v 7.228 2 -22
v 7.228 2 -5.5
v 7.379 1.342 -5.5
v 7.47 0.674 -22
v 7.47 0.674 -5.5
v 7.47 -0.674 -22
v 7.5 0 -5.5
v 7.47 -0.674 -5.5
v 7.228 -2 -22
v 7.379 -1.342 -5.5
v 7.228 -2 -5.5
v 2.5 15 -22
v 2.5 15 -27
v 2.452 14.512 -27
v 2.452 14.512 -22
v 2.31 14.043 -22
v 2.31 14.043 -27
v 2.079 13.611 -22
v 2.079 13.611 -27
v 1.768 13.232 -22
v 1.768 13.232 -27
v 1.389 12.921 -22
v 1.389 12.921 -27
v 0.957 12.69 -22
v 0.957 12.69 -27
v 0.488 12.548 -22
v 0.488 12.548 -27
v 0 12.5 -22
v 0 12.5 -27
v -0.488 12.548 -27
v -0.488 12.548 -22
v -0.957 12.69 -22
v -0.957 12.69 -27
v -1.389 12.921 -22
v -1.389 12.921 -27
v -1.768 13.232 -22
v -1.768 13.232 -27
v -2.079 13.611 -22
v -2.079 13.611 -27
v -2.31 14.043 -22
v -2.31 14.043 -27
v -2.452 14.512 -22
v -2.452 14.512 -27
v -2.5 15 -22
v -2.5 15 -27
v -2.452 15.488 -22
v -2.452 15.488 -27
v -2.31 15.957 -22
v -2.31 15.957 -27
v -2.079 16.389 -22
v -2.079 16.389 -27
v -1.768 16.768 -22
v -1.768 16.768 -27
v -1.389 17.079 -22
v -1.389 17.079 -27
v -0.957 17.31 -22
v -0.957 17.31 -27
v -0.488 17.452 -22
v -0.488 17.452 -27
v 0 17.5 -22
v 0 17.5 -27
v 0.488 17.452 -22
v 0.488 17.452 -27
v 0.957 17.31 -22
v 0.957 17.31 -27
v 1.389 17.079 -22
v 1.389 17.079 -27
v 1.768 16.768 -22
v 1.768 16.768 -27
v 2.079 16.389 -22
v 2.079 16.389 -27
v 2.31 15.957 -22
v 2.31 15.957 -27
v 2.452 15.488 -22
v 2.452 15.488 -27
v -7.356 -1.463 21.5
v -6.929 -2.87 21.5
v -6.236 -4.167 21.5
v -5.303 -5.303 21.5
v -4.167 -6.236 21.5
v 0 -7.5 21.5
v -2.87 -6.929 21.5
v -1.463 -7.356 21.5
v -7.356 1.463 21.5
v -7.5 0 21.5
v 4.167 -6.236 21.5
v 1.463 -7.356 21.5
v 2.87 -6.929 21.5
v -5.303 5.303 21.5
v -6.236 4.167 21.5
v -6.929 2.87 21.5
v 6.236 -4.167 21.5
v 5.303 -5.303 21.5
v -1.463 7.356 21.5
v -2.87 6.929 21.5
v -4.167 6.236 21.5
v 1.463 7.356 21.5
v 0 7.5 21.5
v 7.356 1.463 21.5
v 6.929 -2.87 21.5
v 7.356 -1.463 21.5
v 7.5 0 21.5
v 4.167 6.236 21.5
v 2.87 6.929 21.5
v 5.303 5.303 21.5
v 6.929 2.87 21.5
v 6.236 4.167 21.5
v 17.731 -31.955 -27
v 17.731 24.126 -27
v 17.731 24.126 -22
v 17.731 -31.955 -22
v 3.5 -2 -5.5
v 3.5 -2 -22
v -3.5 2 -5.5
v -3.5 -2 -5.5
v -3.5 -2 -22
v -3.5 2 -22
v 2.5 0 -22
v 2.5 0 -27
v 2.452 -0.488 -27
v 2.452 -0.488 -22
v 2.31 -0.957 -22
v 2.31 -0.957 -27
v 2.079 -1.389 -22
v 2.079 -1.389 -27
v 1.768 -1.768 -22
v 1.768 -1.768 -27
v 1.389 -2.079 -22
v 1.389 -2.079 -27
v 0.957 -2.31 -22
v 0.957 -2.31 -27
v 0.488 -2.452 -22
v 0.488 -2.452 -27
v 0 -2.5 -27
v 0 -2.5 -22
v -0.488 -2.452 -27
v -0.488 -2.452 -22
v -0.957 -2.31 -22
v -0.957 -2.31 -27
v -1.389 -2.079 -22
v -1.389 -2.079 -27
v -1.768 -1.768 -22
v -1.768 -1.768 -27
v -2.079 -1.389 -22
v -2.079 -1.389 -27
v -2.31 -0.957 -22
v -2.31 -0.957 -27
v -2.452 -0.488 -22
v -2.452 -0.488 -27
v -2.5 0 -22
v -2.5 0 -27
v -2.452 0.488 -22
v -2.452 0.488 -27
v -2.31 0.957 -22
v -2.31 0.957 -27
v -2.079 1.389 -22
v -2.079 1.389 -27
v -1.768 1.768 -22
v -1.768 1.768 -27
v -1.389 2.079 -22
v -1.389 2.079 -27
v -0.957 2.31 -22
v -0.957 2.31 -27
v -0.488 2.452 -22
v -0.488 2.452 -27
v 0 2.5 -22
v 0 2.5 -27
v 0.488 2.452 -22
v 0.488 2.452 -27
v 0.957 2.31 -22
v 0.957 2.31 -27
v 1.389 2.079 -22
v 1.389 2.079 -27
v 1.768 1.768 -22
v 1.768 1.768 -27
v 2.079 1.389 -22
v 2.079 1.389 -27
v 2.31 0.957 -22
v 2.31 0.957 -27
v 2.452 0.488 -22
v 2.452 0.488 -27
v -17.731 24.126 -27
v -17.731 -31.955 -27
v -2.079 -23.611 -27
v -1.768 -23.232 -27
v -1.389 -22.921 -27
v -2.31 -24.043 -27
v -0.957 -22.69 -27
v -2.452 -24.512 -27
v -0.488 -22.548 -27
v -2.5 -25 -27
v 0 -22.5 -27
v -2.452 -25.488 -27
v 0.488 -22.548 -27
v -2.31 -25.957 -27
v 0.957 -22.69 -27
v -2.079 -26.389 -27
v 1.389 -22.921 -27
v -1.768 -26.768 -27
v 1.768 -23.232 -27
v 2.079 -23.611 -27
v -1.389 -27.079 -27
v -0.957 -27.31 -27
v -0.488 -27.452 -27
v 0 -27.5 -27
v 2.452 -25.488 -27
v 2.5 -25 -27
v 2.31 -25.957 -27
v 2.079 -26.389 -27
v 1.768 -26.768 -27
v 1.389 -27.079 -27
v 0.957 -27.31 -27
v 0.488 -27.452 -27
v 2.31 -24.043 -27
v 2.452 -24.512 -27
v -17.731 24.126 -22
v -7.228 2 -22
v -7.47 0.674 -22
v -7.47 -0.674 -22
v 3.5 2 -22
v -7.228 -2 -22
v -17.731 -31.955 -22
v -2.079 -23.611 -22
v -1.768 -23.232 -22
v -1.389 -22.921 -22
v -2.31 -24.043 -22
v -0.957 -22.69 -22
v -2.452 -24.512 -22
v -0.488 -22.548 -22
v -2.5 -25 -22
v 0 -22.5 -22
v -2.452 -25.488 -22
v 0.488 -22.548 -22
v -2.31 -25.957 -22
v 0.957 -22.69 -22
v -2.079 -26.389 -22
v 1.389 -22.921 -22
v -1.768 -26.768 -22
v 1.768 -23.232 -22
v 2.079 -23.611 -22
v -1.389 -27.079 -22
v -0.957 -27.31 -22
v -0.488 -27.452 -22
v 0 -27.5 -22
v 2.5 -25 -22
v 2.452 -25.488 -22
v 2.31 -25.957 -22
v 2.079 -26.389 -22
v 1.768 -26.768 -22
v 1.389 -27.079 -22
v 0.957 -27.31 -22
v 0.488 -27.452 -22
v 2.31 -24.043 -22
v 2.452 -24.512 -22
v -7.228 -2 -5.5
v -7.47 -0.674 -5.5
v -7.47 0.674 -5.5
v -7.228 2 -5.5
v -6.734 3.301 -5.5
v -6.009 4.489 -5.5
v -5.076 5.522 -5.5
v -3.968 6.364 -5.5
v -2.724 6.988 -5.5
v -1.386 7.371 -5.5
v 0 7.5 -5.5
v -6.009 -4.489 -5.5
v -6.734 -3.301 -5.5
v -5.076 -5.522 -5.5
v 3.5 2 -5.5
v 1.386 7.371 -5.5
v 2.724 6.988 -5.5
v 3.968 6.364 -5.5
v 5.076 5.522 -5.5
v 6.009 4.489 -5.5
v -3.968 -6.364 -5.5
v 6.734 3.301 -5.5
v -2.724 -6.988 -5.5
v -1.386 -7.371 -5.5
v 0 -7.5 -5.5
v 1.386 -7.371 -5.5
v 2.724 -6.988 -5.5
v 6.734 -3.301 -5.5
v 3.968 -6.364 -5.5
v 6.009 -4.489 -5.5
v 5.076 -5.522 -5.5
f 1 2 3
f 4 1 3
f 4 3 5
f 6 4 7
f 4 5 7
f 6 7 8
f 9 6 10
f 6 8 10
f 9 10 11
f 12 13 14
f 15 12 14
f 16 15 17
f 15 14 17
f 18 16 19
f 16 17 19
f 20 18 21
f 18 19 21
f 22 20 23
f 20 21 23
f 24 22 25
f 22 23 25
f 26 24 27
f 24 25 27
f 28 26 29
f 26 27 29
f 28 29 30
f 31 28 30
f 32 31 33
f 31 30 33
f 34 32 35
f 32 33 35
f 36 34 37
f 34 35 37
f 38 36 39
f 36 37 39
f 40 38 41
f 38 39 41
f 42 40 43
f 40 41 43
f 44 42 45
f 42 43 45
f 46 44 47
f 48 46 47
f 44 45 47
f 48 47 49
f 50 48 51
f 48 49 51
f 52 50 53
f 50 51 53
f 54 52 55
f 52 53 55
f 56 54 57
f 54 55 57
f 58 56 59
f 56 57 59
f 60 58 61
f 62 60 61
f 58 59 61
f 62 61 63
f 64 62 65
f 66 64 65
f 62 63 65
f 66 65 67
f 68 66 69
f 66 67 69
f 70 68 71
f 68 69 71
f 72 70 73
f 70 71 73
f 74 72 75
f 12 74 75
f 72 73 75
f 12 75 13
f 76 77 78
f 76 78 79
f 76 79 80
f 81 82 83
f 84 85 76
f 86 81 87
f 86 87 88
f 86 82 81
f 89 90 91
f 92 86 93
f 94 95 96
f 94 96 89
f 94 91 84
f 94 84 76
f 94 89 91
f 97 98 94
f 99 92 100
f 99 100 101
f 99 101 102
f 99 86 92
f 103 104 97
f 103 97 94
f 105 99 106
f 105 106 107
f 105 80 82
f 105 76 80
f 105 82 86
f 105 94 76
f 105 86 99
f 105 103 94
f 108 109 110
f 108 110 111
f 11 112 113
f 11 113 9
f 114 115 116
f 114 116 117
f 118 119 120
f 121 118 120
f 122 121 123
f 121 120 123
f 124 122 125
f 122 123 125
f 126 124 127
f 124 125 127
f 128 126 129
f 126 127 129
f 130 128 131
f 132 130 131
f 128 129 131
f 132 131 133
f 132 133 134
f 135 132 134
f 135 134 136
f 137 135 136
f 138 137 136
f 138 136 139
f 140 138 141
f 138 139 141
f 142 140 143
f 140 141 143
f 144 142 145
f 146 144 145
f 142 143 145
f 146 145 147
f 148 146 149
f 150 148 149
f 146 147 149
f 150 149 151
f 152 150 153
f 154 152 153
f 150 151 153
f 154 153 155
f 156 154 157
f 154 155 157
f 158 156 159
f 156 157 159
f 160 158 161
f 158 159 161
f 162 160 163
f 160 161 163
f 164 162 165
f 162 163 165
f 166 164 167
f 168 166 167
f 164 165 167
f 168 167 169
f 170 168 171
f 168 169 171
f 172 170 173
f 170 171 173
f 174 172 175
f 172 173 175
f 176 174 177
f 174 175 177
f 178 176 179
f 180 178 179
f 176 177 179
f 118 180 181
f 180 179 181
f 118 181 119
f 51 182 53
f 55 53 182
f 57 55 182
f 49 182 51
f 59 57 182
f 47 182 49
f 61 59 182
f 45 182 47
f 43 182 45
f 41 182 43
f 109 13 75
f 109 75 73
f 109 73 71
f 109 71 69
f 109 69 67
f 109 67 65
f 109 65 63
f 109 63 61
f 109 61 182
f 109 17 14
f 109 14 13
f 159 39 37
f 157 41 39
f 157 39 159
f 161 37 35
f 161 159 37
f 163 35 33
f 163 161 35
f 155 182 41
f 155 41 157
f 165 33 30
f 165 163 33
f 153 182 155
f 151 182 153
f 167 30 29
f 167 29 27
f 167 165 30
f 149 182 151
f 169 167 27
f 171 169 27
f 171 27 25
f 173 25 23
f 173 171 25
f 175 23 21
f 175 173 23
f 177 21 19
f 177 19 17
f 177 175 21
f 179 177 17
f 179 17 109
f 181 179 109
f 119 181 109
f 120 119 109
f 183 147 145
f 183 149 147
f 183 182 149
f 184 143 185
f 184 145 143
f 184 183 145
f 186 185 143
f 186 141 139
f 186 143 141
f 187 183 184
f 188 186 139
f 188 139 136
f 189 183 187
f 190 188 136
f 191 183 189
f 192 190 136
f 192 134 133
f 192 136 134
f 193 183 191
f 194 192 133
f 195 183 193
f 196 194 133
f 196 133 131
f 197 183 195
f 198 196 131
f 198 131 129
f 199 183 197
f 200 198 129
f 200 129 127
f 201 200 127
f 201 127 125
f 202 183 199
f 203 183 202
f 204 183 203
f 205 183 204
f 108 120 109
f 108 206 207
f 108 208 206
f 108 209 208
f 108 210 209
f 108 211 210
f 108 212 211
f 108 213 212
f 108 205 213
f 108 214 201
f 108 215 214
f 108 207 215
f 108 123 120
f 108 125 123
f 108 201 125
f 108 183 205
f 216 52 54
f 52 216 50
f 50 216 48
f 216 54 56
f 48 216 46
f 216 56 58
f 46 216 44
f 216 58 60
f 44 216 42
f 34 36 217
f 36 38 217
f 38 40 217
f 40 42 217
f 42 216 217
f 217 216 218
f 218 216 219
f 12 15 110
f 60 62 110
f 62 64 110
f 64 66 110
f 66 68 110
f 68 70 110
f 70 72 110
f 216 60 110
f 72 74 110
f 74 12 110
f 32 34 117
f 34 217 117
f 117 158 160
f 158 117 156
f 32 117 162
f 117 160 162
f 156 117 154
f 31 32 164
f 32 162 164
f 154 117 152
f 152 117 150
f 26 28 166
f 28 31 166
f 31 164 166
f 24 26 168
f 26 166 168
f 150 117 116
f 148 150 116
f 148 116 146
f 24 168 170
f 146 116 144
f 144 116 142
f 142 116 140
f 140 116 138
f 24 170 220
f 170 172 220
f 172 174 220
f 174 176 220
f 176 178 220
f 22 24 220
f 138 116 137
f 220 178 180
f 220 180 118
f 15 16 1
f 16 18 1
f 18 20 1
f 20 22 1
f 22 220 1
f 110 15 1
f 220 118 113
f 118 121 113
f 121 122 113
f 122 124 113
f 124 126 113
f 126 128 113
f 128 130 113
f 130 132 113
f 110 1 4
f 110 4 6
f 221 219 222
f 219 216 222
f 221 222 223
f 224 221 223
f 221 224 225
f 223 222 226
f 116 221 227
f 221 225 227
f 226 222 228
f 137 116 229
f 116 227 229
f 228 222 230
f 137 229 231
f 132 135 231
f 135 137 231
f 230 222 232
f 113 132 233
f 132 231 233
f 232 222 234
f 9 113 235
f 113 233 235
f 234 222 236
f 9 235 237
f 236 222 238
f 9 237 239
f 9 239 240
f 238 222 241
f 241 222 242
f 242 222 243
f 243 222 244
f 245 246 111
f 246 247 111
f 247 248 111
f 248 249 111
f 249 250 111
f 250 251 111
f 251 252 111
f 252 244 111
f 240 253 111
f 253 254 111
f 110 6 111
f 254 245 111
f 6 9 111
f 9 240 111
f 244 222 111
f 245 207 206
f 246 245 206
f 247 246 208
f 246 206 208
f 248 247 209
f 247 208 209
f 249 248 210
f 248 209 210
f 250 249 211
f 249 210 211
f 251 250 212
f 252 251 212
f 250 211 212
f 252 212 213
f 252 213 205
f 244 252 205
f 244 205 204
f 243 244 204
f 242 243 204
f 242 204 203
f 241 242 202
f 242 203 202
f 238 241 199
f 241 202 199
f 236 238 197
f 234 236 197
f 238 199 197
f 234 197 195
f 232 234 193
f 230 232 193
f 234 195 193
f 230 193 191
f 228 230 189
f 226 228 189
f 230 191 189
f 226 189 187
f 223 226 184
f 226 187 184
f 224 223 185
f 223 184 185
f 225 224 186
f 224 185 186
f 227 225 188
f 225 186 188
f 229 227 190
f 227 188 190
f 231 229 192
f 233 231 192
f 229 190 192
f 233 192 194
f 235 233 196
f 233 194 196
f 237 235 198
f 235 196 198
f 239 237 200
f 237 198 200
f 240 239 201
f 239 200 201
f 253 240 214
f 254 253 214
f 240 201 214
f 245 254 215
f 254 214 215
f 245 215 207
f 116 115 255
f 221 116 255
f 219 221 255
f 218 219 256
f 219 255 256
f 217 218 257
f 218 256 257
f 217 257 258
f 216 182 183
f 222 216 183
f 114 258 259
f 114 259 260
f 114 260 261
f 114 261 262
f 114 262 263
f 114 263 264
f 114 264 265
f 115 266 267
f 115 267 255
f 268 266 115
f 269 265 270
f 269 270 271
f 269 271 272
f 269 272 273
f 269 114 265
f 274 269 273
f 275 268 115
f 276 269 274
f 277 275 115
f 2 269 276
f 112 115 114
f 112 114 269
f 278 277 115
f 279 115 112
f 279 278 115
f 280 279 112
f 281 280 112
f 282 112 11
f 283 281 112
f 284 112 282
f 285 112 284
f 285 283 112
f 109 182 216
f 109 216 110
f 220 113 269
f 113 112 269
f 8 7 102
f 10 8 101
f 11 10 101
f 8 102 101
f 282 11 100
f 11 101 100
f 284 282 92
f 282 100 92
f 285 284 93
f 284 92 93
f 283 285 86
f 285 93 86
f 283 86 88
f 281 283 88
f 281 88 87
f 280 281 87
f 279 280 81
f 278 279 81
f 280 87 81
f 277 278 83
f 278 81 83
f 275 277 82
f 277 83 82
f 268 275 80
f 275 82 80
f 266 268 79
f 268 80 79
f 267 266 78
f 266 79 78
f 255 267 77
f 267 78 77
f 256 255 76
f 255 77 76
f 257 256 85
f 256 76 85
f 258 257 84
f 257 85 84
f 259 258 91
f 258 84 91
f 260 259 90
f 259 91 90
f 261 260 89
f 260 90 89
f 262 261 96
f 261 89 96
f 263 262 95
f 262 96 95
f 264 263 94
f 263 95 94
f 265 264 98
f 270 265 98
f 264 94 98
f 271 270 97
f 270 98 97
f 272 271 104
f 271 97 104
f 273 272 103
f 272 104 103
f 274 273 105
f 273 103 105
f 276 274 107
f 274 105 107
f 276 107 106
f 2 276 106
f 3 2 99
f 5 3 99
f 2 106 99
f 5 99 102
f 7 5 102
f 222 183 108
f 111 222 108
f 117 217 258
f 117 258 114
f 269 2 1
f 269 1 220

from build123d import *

# Parameters (mm, degrees)
SKETCH_R     = 7.5
PAD_DEPTH    = 9
SKETCH001_R  = 7.5
PAD001_DEPTH = 2
SKETCH002_R  = 7.5
PAD002_DEPTH = 9
SKETCH003_R  = 7.5
PAD003_DEPTH = 1.5
SKETCH004_R  = 7.5
PAD004_DEPTH = 5.5
PAD005_DEPTH = 21.5
SKETCH006_R  = 12.5
PAD006_DEPTH = 5
SKETCH007_W  = 35.462824
SKETCH007_H  = 56.081524
SKETCH007_R  = 2.5
PAD007_DEPTH = 5


with BuildPart() as part:
    # Sketch → Pad (new body)
    with BuildSketch(Plane.XY):
        Circle(SKETCH_R)
    extrude(amount=PAD_DEPTH)

    # Sketch001 (on Face3 of Pad) → Pad001 (join)
    with BuildSketch(Plane.XY.offset(9)):
        Circle(SKETCH001_R)
    extrude(amount=PAD001_DEPTH)

    # Sketch002 (on Face4 of Pad001) → Pad002 (join)
    with BuildSketch(Plane.XY.offset(11)):
        Circle(SKETCH002_R)
    extrude(amount=PAD002_DEPTH)

    # Sketch003 (on Face5 of Pad002) → Pad003 (join)
    with BuildSketch(Plane.XY.offset(20)):
        Circle(SKETCH003_R)
    extrude(amount=PAD003_DEPTH)

    # Sketch004 (on Face2 of Pad003) → Pad004 (join)
    with BuildSketch(Plane(origin=(0, 0, 0), x_dir=(1, 0, 0), z_dir=(0, 0, -1))):
        Circle(SKETCH004_R)
    extrude(amount=PAD004_DEPTH)

    # Sketch005 (on Face4 of Pad004) → Pad005 (join)
    with BuildSketch(Plane(origin=(0, 0, -5.5), x_dir=(1, 0, 0), z_dir=(0, 0, -1))):
        with BuildLine():
            Line((3.5, 2), (3.5, -2))
            Line((3.5, -2), (7.228416, -2))
            ThreePointArc((7.228416, -2), (7.5, 0), (7.228416, 2))
            Line((3.5, 2), (7.228416, 2))
        make_face()
        with BuildLine():
            Line((-3.5, 2), (-3.5, -2))
            Line((-3.5, -2), (-7.228416, -2))
            ThreePointArc((-7.228416, 2), (-7.5, 0), (-7.228416, -2))
            Line((-3.5, 2), (-7.228416, 2))
        make_face()
    extrude(amount=PAD005_DEPTH)

    # Sketch006 (on Face15 of Pad005) → Pad006 (join)
    with BuildSketch(Plane(origin=(0, 0, -27), x_dir=(1, 0, 0), z_dir=(0, 0, -1))):
        Circle(SKETCH006_R)
        with BuildLine():
            ThreePointArc((10.816654, 2), (0, 11), (-10.816654, 2))
            Line((-3.5, 2), (-10.816654, 2))
            Line((-3.5, -2), (-3.5, 2))
            Line((-10.816654, -2), (-3.5, -2))
            ThreePointArc((-10.816654, -2), (0, -11), (10.816654, -2))
            Line((10.816654, -2), (3.5, -2))
            Line((3.5, -2), (3.5, 2))
            Line((3.5, 2), (10.816654, 2))
        make_face(mode=Mode.SUBTRACT)
    extrude(amount=-PAD006_DEPTH)

    # Sketch007 (on Face31 of Pad006) → Pad007 (join)
    with BuildSketch(Plane(origin=(0, 0, -27), x_dir=(1, 0, 0), z_dir=(0, 0, -1))):
        with Locations((0, 3.914595)):
            Rectangle(SKETCH007_W, SKETCH007_H)
        with Locations((0, 25)):
            Circle(SKETCH007_R, mode=Mode.SUBTRACT)
        with Locations((0, -15)):
            Circle(SKETCH007_R, mode=Mode.SUBTRACT)
        Circle(SKETCH007_R, mode=Mode.SUBTRACT)
    extrude(amount=-PAD007_DEPTH)


solid = part.part
